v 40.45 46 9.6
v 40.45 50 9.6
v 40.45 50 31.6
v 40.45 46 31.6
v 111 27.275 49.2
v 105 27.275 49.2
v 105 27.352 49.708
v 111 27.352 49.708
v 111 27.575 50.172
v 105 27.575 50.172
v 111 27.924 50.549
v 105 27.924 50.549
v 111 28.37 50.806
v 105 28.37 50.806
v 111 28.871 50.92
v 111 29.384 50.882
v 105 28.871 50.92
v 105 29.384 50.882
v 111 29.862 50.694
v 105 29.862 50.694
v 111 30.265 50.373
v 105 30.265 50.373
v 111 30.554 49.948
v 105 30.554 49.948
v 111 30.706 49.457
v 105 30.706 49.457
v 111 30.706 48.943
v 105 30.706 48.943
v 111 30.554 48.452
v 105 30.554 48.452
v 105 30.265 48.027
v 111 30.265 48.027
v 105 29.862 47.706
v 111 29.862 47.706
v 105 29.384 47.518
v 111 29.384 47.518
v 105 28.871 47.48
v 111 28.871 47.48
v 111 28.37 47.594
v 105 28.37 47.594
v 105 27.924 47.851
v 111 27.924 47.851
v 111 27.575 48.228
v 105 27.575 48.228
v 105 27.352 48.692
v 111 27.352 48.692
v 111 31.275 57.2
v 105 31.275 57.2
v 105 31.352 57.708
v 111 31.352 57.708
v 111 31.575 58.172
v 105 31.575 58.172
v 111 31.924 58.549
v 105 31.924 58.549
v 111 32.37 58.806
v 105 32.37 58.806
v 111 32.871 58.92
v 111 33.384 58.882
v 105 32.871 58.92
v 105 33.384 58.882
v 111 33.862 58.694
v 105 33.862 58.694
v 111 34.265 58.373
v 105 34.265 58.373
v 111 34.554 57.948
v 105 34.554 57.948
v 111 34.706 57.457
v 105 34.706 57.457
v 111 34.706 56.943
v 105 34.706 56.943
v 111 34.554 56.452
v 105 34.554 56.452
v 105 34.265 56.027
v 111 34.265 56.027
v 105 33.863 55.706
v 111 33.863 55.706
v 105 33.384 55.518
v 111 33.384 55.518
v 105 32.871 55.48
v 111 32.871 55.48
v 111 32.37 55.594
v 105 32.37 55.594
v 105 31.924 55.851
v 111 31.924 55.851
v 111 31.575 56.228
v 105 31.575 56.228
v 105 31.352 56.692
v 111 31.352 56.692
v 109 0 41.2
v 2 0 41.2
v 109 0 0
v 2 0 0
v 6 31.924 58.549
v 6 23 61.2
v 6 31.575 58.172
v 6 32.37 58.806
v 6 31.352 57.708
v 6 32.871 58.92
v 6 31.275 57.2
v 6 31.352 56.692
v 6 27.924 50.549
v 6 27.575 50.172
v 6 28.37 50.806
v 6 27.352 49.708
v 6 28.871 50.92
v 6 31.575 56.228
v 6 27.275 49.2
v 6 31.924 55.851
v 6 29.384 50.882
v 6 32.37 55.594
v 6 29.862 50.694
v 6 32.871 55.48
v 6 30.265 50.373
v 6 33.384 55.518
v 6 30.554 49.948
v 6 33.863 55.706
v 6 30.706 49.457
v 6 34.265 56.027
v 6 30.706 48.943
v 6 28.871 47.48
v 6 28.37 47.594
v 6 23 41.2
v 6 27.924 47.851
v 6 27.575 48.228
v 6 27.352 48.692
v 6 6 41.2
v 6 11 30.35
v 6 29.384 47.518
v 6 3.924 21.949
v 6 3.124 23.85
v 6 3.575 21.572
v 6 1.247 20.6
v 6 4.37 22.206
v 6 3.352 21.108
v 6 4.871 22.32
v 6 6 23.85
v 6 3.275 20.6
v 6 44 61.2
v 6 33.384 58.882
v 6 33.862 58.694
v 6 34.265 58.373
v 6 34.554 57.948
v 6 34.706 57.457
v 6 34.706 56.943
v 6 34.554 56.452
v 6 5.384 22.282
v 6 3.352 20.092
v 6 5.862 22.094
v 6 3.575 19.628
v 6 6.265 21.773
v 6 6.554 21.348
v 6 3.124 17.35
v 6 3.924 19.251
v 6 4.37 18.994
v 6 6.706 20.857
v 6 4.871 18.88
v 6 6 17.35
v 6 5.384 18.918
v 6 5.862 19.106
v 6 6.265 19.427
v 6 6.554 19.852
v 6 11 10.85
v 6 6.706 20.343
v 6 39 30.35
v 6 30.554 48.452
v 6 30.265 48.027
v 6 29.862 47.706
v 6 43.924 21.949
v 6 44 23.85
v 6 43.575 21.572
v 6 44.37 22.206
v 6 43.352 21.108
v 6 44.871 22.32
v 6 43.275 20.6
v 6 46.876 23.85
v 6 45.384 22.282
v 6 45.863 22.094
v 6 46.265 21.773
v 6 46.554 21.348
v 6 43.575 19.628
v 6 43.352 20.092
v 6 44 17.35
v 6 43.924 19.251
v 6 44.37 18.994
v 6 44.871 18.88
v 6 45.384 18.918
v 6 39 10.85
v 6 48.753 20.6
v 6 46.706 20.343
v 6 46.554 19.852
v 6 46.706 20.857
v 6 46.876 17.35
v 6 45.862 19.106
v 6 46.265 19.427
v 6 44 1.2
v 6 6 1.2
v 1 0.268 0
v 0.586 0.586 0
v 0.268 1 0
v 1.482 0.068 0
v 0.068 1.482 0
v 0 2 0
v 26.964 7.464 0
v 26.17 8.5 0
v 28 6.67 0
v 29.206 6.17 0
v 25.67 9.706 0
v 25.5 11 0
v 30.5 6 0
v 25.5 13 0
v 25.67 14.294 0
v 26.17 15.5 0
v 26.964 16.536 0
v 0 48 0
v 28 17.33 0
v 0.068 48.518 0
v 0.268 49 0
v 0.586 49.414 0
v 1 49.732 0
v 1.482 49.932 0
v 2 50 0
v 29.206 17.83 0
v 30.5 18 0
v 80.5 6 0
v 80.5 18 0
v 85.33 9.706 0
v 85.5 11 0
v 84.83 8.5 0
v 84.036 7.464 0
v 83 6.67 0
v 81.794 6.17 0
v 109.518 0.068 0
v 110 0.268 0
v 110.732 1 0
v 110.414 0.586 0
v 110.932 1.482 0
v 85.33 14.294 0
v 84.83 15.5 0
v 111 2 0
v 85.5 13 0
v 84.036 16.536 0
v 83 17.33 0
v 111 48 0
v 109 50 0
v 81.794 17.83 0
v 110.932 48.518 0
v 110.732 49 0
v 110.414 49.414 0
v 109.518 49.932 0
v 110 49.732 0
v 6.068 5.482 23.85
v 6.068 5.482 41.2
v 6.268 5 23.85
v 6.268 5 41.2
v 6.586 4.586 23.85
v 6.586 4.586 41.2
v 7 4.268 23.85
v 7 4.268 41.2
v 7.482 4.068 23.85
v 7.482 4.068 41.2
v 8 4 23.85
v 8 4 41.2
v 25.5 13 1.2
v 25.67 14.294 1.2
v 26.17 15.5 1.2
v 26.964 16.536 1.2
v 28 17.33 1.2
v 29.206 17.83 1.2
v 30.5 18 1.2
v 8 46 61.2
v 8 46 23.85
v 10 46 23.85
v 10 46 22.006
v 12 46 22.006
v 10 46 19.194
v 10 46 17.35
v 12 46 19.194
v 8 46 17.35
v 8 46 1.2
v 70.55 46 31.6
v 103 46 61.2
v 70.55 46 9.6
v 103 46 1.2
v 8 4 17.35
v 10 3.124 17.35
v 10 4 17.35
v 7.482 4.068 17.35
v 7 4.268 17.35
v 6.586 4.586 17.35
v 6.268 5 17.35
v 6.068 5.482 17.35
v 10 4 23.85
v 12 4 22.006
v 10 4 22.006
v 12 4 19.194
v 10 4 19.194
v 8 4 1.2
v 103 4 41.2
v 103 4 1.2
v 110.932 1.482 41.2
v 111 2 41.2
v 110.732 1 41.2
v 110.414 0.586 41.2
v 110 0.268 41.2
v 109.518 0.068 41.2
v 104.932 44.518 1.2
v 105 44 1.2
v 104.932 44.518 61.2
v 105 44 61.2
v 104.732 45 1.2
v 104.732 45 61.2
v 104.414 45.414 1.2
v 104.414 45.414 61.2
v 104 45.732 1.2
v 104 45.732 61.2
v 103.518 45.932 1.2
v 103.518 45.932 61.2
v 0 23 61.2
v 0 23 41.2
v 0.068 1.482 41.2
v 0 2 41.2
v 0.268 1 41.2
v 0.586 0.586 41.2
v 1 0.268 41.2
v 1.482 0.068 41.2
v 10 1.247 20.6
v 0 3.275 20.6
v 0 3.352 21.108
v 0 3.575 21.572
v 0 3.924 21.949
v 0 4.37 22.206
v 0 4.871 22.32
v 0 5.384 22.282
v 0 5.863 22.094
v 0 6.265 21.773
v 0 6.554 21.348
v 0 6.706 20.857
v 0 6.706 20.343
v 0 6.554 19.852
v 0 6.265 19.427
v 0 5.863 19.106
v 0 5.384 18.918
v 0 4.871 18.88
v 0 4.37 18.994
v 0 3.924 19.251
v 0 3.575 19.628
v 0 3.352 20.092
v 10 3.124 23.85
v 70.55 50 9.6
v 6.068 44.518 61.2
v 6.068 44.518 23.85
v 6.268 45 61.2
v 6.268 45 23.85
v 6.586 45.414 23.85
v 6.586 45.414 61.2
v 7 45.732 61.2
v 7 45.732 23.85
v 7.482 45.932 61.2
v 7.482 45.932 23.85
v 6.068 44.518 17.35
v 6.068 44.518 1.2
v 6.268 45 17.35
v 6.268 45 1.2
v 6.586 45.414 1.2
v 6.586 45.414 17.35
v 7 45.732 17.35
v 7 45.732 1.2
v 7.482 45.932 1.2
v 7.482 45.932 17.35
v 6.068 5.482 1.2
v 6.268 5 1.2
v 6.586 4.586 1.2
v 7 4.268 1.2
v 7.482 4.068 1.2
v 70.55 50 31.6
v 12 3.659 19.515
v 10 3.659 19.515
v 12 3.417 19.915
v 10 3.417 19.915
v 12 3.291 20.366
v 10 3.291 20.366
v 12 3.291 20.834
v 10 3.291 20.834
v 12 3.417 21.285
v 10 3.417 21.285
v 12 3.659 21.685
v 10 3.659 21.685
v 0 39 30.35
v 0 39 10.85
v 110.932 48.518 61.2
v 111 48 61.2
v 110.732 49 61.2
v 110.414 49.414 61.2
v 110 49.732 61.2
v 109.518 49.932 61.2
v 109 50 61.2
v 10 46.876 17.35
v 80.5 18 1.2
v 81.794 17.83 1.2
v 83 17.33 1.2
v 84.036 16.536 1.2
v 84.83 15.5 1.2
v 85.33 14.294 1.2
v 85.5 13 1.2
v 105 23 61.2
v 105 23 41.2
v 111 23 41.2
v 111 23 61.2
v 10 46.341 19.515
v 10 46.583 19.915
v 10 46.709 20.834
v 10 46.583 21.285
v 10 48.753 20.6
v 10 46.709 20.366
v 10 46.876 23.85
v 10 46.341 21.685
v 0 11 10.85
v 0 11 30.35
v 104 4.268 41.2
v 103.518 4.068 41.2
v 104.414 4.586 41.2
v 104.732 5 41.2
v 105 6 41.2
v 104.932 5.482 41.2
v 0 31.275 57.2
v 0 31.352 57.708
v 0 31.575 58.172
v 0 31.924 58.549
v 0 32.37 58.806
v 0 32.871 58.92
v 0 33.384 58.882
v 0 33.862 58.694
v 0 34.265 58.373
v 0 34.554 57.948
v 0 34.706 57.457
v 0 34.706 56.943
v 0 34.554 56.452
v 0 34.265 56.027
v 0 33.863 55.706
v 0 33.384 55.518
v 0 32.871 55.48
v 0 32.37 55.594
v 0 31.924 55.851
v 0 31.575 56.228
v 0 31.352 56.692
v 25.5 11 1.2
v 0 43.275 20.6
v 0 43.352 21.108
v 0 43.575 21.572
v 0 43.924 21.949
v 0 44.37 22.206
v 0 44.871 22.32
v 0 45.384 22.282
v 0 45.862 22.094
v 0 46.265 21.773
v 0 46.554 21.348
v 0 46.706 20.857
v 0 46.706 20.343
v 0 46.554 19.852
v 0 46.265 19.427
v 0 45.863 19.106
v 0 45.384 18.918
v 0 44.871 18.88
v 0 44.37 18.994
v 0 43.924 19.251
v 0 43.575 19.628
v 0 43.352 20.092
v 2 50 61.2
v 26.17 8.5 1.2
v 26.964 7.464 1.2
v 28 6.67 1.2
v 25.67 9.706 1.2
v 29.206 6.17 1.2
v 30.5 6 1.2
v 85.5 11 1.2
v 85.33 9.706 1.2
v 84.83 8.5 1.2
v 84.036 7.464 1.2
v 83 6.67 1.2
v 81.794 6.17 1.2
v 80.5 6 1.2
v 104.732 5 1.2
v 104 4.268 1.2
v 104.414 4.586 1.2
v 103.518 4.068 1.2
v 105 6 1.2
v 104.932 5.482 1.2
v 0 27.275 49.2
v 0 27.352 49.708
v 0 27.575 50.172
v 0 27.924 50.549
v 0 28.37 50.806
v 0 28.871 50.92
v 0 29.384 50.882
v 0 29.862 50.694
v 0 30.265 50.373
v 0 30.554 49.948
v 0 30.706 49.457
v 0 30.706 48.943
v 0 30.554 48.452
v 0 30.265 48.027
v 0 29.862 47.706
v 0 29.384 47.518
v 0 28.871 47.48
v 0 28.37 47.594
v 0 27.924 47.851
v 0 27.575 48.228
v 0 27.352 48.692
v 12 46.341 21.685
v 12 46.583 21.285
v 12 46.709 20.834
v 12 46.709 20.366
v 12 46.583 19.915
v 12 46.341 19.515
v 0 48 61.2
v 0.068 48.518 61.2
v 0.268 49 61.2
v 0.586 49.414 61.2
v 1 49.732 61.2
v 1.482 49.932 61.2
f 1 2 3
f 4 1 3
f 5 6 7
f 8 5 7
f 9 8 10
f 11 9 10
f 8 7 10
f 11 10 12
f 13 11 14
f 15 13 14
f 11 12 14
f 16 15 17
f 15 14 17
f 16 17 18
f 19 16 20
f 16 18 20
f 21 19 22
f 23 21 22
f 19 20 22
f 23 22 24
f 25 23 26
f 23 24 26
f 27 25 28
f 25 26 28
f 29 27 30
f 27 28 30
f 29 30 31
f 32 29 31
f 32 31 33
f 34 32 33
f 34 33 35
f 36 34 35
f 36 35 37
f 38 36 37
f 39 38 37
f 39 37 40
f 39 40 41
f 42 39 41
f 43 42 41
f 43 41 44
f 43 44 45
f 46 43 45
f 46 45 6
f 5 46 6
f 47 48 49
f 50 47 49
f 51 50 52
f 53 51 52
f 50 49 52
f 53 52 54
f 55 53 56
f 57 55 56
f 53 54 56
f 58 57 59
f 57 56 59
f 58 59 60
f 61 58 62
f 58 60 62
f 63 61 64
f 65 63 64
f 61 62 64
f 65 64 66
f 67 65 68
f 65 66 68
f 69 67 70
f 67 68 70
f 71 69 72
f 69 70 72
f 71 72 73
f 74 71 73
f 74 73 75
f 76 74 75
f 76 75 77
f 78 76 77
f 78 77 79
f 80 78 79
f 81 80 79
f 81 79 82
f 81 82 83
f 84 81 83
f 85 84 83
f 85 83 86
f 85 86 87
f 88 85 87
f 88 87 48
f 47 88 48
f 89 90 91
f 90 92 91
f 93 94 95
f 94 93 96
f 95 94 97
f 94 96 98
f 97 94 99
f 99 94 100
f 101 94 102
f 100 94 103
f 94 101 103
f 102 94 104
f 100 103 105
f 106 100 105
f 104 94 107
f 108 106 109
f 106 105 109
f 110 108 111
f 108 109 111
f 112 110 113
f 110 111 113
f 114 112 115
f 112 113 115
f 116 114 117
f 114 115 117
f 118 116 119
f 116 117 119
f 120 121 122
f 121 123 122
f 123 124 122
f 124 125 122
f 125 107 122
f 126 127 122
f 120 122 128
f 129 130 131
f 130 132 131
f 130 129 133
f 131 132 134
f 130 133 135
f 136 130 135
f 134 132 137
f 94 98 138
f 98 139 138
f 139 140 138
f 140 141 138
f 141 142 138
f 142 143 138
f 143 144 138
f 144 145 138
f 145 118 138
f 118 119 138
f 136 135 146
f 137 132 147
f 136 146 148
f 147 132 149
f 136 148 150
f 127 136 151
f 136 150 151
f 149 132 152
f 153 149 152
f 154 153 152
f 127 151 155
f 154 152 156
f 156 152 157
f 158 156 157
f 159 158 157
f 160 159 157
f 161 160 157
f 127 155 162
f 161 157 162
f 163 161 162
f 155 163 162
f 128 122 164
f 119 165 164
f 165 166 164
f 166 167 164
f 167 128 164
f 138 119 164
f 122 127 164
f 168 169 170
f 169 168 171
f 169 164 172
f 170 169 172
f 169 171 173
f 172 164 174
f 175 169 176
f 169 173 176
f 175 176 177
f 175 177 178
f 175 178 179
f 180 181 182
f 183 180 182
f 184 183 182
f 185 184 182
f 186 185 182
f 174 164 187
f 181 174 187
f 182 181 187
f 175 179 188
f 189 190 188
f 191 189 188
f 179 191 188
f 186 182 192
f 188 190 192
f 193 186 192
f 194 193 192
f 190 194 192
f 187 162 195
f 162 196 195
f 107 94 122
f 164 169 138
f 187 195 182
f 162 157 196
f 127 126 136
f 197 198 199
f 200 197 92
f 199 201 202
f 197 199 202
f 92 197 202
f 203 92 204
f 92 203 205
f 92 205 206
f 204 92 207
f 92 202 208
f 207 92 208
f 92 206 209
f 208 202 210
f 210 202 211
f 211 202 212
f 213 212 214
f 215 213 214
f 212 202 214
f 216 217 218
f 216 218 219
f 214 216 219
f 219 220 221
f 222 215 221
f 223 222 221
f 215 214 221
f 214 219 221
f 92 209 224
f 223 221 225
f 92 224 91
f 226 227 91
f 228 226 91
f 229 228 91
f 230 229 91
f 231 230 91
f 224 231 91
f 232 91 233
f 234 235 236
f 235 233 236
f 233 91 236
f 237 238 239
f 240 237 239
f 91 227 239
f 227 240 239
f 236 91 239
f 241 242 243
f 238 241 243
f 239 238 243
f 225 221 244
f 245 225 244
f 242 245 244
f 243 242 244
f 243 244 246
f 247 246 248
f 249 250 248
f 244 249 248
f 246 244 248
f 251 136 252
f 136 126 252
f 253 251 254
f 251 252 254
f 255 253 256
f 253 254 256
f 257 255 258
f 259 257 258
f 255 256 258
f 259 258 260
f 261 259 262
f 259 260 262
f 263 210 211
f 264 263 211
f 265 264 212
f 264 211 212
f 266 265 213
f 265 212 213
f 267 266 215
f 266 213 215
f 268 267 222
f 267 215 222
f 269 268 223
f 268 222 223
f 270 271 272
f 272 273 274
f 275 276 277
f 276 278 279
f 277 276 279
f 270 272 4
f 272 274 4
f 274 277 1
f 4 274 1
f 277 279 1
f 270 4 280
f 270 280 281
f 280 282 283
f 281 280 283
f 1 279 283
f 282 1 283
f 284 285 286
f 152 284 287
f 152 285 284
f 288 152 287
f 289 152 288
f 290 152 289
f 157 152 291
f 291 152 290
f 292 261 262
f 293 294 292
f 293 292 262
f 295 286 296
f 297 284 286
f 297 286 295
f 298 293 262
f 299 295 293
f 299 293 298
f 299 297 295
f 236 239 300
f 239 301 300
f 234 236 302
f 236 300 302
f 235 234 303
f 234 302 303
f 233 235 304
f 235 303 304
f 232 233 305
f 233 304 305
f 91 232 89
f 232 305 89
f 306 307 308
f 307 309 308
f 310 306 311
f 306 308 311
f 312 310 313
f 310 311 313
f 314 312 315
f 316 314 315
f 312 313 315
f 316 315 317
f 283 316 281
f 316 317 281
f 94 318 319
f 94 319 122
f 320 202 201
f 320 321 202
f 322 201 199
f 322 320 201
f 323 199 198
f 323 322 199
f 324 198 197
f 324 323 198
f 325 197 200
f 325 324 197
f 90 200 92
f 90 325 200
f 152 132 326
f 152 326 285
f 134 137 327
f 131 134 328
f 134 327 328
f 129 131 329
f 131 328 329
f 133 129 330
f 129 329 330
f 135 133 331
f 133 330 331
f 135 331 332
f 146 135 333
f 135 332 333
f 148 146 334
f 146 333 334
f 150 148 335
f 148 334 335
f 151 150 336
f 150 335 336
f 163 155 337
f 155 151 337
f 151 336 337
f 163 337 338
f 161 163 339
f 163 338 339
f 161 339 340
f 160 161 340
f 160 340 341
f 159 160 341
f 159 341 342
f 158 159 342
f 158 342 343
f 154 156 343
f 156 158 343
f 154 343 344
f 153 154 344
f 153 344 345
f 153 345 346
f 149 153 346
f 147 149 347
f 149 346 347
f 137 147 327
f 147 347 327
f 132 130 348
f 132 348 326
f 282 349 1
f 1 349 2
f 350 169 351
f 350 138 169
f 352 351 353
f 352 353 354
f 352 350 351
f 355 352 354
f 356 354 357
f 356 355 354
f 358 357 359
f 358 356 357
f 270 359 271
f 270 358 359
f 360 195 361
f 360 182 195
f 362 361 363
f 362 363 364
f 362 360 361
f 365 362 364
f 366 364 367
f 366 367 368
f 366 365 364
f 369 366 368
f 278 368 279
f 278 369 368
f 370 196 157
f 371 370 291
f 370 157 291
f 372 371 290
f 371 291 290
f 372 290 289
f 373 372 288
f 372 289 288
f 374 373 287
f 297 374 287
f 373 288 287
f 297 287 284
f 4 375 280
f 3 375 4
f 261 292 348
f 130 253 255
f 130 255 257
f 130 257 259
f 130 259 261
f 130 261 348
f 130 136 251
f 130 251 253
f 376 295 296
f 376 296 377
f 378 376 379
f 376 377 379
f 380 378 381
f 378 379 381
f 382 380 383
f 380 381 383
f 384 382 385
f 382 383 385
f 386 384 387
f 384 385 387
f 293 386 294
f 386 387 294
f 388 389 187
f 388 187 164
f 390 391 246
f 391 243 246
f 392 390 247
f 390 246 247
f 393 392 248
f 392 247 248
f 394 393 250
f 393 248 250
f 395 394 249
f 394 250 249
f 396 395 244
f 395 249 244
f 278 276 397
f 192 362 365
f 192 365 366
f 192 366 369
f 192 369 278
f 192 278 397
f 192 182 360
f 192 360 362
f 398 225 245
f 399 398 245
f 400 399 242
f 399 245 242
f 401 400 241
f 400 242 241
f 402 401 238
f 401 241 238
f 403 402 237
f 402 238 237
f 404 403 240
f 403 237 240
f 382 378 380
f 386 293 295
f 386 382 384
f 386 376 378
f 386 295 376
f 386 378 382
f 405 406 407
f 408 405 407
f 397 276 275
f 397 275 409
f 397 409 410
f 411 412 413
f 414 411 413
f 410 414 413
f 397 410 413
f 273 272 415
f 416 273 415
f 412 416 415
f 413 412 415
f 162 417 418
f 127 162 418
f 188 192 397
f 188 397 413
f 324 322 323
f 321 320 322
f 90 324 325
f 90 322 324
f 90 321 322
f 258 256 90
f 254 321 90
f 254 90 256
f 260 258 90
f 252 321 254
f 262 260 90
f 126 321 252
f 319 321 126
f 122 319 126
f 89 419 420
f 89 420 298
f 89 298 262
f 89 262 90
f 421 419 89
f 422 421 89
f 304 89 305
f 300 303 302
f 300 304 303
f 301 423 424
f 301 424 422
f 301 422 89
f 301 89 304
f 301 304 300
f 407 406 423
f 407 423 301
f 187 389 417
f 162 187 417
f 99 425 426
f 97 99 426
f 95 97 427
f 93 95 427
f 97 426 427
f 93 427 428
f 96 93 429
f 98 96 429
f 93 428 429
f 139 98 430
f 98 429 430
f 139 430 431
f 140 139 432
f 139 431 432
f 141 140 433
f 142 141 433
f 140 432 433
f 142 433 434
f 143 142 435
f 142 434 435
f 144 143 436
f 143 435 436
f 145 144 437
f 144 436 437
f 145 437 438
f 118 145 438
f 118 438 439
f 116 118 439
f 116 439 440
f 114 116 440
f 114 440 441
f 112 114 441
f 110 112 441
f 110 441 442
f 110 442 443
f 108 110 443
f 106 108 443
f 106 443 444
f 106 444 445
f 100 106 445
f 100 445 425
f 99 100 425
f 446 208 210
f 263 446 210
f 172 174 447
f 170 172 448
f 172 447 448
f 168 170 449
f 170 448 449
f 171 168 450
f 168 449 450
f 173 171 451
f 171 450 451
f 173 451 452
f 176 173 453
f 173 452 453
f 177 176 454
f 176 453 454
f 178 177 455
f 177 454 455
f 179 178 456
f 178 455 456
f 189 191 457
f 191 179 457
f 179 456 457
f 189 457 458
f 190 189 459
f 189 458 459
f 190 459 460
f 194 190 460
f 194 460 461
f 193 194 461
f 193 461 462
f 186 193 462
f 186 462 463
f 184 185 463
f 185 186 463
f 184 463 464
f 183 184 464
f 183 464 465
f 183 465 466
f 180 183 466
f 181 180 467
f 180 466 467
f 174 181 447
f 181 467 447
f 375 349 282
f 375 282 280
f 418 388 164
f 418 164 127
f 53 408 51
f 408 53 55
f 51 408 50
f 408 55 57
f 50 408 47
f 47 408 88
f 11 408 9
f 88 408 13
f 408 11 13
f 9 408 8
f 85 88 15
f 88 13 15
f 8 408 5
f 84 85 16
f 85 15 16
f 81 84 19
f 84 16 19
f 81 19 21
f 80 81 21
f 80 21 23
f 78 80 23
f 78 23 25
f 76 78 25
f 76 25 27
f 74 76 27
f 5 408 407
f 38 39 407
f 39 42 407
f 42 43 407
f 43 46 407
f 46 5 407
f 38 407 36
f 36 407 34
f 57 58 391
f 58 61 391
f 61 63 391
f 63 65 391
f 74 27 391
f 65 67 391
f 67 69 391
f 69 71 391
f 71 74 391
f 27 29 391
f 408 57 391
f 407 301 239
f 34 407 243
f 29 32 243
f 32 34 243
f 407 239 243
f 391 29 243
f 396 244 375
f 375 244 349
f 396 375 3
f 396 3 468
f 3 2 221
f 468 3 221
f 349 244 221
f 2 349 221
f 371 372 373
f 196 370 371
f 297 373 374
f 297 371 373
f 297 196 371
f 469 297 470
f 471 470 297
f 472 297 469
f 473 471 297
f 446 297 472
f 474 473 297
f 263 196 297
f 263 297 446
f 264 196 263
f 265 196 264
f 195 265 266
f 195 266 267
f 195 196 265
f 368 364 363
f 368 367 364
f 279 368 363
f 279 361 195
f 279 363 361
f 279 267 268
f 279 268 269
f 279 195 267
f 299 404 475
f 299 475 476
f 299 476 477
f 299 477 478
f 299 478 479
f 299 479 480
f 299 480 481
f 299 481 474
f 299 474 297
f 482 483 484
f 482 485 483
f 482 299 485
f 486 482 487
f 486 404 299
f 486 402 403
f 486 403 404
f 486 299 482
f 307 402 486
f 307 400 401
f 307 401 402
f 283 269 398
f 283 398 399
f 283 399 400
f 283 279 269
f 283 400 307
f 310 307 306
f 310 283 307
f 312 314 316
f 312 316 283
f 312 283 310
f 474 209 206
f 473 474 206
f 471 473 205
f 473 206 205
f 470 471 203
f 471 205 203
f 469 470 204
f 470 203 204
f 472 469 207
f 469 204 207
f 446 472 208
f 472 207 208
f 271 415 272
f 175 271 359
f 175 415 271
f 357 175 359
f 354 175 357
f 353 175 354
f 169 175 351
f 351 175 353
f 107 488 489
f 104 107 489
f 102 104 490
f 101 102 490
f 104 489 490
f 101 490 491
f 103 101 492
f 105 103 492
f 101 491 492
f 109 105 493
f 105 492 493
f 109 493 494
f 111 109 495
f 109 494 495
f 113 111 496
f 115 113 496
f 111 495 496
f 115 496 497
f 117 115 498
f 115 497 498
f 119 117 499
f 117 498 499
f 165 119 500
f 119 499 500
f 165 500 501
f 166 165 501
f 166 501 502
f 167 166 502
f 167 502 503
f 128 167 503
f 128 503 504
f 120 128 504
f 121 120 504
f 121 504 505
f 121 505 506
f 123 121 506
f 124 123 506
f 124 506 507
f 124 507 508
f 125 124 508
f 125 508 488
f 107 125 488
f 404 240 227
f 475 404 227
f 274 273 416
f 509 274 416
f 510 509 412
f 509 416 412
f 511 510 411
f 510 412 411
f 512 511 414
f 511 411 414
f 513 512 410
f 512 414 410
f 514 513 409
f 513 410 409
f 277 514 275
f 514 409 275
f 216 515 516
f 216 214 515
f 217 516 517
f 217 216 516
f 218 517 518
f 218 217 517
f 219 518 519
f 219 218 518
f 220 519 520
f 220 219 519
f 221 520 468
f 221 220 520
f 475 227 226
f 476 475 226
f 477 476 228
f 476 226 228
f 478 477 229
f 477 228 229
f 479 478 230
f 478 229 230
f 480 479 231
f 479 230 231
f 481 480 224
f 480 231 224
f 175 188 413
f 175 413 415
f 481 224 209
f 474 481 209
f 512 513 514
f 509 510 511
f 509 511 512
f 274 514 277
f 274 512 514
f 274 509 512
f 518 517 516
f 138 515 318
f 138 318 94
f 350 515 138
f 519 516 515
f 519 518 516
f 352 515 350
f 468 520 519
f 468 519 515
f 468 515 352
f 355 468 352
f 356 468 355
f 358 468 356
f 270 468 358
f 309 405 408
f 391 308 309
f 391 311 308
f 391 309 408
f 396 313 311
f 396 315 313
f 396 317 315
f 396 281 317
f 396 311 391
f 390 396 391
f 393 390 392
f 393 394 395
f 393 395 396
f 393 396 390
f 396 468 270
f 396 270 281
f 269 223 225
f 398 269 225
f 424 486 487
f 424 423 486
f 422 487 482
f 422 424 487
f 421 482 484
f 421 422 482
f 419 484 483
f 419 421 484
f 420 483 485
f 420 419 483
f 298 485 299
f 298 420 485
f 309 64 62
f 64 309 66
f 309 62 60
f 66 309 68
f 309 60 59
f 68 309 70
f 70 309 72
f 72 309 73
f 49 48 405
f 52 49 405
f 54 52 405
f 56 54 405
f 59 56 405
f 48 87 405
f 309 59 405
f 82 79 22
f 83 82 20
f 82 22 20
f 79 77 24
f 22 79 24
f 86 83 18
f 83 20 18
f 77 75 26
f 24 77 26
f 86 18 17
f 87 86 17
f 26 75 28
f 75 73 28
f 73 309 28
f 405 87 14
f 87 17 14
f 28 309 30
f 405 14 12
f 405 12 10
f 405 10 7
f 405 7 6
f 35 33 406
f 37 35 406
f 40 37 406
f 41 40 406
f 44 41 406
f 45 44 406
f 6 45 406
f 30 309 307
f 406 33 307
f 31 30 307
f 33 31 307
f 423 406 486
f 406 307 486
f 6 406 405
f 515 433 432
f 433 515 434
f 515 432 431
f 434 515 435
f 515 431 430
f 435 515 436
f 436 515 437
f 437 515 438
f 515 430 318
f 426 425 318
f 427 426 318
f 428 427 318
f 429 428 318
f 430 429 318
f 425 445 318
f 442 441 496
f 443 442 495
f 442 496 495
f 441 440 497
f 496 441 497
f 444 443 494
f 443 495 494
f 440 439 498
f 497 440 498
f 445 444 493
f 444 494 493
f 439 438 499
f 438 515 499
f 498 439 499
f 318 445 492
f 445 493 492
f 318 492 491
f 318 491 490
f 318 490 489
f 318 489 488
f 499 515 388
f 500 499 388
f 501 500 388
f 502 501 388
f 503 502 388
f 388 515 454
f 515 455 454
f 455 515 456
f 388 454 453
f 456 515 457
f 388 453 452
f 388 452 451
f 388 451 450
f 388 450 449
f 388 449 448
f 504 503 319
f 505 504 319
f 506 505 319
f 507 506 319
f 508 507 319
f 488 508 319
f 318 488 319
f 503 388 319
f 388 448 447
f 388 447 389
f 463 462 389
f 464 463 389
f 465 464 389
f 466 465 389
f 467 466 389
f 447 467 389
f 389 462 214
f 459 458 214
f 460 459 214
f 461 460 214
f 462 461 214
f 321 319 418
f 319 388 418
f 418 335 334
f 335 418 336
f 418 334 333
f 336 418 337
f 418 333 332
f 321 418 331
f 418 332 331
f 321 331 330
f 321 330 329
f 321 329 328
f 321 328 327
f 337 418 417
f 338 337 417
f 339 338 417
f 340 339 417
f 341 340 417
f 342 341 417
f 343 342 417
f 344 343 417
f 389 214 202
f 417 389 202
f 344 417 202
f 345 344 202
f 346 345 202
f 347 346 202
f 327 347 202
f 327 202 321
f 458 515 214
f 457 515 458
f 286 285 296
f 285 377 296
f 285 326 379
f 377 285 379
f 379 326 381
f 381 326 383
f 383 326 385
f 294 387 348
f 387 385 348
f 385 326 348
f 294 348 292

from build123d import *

# Parameters (mm, degrees)
F0_W      = 111
F0_H      = 50
F0_W_2    = 99
F0_H_2    = 42
F1_DEPTH  = 1.2
F2_DEPTH  = 41.2
F3_W      = 30.1
F3_H      = 22
F4_DEPTH  = 4
F6_DEPTH  = 20
F7_R      = 1.725
F8_DEPTH  = 114.6
F7_W      = 28
F7_H      = 19.5
F9_DEPTH  = 12
F11_DEPTH = 4
F12_R     = 2


# Not quite as in the source:
# - a feature names something its author has since deleted; it is built from what else it names


with BuildPart() as f1:
    # F0 (on Top) → F1 (new body)
    with BuildSketch(Plane.XY):
        with Locations((55.5, 25)):
            Rectangle(F0_W, F0_H)
        with Locations((55.5, 25)):
            Rectangle(F0_W_2, F0_H_2, mode=Mode.SUBTRACT)
        with Locations((55.5, 25)):
            Rectangle(F0_W_2, F0_H_2)
        with BuildLine():
            ThreePointArc((25.5, 13), (26.9644660941, 16.5355339059), (30.5, 18))
            Line((30.5, 18), (80.5, 18))
            ThreePointArc((80.5, 18), (84.0355339059, 16.5355339059), (85.5, 13))
            Line((85.5, 13), (85.5, 11))
            ThreePointArc((85.5, 11), (84.0355339059, 7.4644660941), (80.5, 6))
            Line((80.5, 6), (30.5, 6))
            ThreePointArc((30.5, 6), (26.9644660941, 7.4644660941), (25.5, 11))
            Line((25.5, 11), (25.5, 13))
        make_face(mode=Mode.SUBTRACT)
    extrude(amount=F1_DEPTH)

    # F0 (on Top) → F2 (join)
    with BuildSketch(Plane.XY):
        with Locations((55.5, 25)):
            Rectangle(F0_W, F0_H)
        with Locations((55.5, 25)):
            Rectangle(F0_W_2, F0_H_2, mode=Mode.SUBTRACT)
    extrude(amount=F2_DEPTH)

    # F3 (on face) → F4 (cut)
    with BuildSketch(Plane(origin=(0, 50, 0), x_dir=(-1, 0, 0), z_dir=(0, 1, 0))):
        with Locations((-55.5, 20.6)):
            Rectangle(F3_W, F3_H)
    extrude(amount=-F4_DEPTH, mode=Mode.SUBTRACT)

    # F5 (on face) → F6 (join)
    with BuildSketch(Plane.XY.offset(41.2)):
        Polygon((0, 50), (0, 23), (6, 23), (6, 46), (105, 46), (105, 23), (111, 23), (111, 50), align=None)
    extrude(amount=F6_DEPTH)

    # F7 (on face) → F8 (cut)
    with BuildSketch(Plane(origin=(0, 0, 0), x_dir=(0, -1, 0), z_dir=(-1, 0, 0))):
        with Locations((-29, 49.2)):
            Circle(F7_R)
        with Locations((-33, 57.2)):
            Circle(F7_R)
    extrude(amount=-F8_DEPTH, mode=Mode.SUBTRACT)

    # F7 (on face) → F9 (cut)
    with BuildSketch(Plane(origin=(0, 0, 0), x_dir=(0, -1, 0), z_dir=(-1, 0, 0))):
        with Locations((-25, 20.6)):
            Rectangle(F7_W, F7_H)
        with Locations((-45, 20.6)):
            Circle(F7_R)
        with Locations((-5, 20.6)):
            Circle(F7_R)
    extrude(amount=-F9_DEPTH, mode=Mode.SUBTRACT)

    # F10 (on face) → F11 (cut)
    with BuildSketch(Plane.YZ.offset(6)):
        Polygon((8.7527767497, 20.6), (6.8763883749, 23.85), (3.1236116251, 23.85), (1.2472232503, 20.6), (3.1236116251, 17.35), (6.8763883749, 17.35), align=None)
        Polygon((43.1236116251, 23.85), (41.2472232503, 20.6), (43.1236116251, 17.35), (46.8763883749, 17.35), (48.7527767497, 20.6), (46.8763883749, 23.85), align=None)
    extrude(amount=F11_DEPTH, mode=Mode.SUBTRACT)

    # F12
    f12_edges = [f1.edges().sort_by_distance(p)[0] for p in [
        (6, 46, 42.525),
        (6, 46, 9.275),
        (105, 46, 31.2),
        (105, 4, 21.2),
        (6, 4, 32.525),
        (6, 4, 9.275),
        (111, 0, 20.6),
        (111, 50, 30.6),
        (0, 50, 30.6),
        (0, 0, 20.6),
    ]]
    fillet(f12_edges, radius=F12_R)


solid = f1.part
